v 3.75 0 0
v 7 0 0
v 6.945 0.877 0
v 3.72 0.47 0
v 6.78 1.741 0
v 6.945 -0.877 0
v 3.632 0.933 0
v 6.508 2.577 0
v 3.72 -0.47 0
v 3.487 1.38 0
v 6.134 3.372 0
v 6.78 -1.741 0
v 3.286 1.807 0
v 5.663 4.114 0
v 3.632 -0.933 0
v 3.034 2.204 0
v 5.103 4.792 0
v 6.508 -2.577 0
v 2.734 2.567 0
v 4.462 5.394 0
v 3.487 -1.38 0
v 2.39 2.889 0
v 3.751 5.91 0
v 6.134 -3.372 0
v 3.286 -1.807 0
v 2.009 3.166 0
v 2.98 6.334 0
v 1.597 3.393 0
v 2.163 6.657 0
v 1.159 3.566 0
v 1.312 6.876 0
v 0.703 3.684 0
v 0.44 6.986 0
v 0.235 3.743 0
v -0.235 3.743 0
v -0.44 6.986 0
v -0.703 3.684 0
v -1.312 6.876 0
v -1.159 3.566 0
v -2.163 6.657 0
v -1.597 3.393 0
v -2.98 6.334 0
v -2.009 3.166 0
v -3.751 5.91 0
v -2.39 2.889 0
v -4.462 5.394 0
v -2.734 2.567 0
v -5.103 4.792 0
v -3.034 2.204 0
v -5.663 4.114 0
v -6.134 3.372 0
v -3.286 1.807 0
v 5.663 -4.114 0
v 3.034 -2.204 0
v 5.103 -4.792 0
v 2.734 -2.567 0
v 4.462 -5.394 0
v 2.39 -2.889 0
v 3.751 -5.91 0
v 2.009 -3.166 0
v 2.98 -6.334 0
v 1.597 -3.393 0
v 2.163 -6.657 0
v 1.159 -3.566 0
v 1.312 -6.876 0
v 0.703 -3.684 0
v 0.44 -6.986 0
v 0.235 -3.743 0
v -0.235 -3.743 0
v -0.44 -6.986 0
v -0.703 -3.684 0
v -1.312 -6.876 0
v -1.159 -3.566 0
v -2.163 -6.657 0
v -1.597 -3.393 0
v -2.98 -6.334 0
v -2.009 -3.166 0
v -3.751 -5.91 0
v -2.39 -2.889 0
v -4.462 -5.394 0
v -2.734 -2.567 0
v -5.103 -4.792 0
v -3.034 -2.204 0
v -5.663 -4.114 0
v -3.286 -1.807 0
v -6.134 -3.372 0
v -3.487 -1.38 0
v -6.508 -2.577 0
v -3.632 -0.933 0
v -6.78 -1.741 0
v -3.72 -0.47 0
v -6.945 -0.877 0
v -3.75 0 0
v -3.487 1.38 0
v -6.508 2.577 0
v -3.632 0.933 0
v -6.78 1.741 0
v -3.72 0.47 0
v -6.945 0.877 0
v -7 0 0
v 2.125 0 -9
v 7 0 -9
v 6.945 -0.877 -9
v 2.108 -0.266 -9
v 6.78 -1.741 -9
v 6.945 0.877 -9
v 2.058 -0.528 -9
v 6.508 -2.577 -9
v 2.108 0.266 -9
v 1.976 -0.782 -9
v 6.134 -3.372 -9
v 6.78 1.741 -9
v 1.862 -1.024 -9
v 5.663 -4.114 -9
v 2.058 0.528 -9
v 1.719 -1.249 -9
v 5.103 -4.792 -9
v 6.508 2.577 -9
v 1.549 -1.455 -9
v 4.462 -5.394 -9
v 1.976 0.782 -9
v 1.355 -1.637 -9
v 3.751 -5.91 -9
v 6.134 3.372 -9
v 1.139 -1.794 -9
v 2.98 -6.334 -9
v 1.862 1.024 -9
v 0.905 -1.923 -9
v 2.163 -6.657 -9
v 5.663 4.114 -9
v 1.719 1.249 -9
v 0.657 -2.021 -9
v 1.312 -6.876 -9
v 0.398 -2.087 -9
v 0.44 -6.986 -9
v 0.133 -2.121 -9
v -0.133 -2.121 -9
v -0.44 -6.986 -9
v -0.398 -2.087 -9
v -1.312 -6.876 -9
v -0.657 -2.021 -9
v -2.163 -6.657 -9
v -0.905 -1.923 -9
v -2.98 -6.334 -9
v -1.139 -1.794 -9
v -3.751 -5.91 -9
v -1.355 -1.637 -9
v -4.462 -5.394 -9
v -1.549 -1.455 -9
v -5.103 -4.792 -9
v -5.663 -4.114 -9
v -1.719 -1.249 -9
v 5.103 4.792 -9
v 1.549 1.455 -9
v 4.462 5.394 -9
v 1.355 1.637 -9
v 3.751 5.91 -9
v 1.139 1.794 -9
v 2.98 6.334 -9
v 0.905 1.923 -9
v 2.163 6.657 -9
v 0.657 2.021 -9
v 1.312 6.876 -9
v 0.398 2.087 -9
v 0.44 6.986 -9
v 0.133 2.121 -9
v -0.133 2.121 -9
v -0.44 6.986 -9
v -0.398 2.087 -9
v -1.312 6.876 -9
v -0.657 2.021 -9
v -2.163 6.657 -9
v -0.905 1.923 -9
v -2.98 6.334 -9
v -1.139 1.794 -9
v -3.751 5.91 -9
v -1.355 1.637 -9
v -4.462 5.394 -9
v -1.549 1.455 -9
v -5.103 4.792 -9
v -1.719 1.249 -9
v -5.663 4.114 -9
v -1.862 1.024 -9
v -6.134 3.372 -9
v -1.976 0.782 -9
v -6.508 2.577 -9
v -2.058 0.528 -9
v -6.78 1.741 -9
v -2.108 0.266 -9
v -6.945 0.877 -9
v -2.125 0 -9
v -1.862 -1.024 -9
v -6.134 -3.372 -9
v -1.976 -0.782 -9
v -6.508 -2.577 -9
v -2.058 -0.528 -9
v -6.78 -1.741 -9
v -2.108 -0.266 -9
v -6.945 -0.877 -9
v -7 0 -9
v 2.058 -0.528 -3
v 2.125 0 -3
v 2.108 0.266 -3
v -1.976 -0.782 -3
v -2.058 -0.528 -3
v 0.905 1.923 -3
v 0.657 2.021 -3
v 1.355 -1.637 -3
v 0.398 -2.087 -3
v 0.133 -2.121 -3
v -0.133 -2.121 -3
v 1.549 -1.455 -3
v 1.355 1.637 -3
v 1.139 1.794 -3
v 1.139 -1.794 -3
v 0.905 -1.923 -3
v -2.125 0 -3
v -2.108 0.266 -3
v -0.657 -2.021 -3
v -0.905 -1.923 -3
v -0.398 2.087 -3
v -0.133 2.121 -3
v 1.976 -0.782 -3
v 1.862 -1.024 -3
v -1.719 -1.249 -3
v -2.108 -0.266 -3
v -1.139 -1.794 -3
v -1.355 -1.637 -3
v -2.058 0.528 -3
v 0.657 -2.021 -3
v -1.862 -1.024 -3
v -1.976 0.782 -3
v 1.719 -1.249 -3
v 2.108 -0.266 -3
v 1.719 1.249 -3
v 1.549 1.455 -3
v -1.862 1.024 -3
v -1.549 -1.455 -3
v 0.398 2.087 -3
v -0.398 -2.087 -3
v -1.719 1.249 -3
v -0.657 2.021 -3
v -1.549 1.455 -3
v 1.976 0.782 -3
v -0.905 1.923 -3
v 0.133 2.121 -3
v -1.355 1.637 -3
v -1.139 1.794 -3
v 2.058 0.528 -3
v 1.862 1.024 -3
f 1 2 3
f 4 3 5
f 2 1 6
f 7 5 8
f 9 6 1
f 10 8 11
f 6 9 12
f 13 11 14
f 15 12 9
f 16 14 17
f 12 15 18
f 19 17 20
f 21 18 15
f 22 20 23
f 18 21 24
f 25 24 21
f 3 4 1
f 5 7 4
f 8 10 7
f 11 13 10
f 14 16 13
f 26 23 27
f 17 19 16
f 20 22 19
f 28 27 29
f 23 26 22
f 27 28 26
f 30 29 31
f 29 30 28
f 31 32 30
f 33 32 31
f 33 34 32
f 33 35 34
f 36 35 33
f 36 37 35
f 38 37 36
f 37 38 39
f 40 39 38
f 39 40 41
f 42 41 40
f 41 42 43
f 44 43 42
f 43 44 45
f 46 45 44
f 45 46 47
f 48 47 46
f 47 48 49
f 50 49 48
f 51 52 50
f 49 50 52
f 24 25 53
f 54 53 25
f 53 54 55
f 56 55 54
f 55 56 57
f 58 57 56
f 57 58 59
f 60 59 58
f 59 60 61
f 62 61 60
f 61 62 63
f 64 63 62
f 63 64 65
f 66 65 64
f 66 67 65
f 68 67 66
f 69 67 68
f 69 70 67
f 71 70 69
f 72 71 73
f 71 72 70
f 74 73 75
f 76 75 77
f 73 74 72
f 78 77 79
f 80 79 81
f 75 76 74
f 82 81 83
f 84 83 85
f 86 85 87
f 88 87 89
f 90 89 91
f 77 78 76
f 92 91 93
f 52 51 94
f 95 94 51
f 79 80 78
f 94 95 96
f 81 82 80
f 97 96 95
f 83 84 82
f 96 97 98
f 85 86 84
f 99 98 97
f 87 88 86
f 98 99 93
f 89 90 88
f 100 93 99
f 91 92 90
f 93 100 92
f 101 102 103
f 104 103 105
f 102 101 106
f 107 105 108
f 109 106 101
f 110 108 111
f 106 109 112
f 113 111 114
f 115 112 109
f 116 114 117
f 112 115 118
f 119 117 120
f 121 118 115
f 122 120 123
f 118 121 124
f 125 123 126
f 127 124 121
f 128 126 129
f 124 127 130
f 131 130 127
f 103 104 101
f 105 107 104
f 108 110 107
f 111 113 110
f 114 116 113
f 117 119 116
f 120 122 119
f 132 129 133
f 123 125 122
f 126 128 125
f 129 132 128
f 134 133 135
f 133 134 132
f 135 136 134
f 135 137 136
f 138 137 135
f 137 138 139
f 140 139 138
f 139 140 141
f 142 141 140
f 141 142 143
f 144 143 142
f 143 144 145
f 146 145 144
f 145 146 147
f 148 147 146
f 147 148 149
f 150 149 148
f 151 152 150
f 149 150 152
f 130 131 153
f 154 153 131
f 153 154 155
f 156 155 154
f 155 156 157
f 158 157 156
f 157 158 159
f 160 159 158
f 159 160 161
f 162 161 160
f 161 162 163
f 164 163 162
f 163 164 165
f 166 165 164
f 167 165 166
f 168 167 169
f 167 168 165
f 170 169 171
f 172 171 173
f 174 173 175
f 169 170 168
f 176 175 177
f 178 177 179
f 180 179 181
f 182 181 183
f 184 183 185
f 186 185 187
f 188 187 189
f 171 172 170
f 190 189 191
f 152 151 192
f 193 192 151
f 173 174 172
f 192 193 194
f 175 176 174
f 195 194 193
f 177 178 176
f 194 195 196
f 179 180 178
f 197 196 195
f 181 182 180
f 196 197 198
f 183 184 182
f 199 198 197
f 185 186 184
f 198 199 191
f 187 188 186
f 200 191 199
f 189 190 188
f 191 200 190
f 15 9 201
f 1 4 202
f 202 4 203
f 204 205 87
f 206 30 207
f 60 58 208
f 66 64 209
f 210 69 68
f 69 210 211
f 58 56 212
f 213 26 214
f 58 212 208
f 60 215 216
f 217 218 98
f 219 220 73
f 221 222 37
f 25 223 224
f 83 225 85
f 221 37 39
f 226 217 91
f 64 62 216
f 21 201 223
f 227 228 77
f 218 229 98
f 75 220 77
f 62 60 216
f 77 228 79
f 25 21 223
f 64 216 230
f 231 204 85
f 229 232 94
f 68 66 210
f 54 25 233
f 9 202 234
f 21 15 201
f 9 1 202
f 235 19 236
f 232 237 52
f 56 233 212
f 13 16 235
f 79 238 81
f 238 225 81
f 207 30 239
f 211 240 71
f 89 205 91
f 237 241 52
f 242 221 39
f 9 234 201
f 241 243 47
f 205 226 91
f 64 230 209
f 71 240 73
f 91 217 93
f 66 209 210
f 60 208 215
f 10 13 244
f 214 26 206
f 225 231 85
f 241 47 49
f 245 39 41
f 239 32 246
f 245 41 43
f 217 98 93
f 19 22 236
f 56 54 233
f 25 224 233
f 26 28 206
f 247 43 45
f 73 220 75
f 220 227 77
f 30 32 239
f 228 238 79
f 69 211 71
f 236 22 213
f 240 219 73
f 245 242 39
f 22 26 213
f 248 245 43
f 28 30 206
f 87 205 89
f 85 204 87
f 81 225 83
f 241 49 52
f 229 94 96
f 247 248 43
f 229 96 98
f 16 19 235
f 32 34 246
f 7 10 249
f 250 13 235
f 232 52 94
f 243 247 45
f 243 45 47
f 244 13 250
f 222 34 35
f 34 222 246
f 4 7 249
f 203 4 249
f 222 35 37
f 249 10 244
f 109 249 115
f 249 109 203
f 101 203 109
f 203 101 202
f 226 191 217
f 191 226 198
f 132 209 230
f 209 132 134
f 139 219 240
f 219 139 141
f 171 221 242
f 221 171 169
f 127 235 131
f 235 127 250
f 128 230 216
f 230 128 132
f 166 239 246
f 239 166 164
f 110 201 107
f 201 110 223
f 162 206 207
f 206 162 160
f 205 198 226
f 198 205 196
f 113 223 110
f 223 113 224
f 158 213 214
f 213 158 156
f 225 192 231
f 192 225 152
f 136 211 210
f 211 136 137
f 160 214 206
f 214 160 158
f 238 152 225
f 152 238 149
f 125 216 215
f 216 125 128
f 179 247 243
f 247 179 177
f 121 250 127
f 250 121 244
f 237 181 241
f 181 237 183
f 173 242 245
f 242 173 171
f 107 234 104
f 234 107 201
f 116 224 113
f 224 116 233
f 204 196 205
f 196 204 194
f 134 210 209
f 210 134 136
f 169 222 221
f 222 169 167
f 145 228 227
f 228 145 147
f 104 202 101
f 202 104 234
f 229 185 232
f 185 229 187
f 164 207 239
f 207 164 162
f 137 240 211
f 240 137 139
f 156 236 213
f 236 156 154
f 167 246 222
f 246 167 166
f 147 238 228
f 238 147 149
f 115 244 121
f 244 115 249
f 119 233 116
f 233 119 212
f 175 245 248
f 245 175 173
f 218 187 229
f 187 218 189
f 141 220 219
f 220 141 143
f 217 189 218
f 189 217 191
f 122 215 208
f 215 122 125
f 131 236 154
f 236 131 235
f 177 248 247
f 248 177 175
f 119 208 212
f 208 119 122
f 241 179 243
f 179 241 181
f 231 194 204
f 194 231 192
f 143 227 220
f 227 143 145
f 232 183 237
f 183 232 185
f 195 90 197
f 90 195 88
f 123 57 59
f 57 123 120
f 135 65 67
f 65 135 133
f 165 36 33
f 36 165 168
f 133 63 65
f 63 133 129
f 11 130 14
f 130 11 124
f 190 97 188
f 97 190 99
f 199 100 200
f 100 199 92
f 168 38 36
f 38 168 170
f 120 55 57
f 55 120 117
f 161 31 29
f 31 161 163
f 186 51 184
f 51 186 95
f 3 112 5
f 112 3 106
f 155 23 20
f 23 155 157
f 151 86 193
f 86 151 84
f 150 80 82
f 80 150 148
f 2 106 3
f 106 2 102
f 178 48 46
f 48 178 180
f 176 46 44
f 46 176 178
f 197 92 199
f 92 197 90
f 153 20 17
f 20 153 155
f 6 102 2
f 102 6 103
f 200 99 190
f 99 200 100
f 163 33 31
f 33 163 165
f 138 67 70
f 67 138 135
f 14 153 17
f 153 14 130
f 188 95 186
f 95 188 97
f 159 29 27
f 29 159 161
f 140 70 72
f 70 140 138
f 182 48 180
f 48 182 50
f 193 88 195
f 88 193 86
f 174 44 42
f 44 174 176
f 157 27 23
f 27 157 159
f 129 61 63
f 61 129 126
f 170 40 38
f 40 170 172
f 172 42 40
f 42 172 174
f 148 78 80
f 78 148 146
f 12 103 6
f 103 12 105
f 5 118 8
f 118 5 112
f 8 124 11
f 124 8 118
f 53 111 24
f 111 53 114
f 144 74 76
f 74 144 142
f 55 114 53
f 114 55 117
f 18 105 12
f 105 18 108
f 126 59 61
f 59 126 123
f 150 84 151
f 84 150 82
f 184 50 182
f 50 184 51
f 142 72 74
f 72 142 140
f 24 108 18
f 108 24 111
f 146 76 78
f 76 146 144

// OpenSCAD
$fn = 50;


difference() {
	union() {
		translate(v = [0, 0, -9.0000000000]) {
			cylinder(h = 9, r = 7.0000000000);
		}
	}
	union() {
		translate(v = [0, 0, 0]) {
			rotate(a = [0, 0, 0]) {
				difference() {
					union() {
						#translate(v = [0, 0, -9.0000000000]) {
							cylinder(h = 9, r = 2.0000000000);
						}
						#translate(v = [0, 0, -3]) {
							cylinder(h = 3, r1 = 2.1250000000, r2 = 3.7500000000);
						}
						#translate(v = [0, 0, -9.0000000000]) {
							cylinder(h = 9, r = 2.1250000000);
						}
						#translate(v = [0, 0, -9.0000000000]) {
							cylinder(h = 9, r = 2.0000000000);
						}
					}
					union();
				}
			}
		}
	}
}
